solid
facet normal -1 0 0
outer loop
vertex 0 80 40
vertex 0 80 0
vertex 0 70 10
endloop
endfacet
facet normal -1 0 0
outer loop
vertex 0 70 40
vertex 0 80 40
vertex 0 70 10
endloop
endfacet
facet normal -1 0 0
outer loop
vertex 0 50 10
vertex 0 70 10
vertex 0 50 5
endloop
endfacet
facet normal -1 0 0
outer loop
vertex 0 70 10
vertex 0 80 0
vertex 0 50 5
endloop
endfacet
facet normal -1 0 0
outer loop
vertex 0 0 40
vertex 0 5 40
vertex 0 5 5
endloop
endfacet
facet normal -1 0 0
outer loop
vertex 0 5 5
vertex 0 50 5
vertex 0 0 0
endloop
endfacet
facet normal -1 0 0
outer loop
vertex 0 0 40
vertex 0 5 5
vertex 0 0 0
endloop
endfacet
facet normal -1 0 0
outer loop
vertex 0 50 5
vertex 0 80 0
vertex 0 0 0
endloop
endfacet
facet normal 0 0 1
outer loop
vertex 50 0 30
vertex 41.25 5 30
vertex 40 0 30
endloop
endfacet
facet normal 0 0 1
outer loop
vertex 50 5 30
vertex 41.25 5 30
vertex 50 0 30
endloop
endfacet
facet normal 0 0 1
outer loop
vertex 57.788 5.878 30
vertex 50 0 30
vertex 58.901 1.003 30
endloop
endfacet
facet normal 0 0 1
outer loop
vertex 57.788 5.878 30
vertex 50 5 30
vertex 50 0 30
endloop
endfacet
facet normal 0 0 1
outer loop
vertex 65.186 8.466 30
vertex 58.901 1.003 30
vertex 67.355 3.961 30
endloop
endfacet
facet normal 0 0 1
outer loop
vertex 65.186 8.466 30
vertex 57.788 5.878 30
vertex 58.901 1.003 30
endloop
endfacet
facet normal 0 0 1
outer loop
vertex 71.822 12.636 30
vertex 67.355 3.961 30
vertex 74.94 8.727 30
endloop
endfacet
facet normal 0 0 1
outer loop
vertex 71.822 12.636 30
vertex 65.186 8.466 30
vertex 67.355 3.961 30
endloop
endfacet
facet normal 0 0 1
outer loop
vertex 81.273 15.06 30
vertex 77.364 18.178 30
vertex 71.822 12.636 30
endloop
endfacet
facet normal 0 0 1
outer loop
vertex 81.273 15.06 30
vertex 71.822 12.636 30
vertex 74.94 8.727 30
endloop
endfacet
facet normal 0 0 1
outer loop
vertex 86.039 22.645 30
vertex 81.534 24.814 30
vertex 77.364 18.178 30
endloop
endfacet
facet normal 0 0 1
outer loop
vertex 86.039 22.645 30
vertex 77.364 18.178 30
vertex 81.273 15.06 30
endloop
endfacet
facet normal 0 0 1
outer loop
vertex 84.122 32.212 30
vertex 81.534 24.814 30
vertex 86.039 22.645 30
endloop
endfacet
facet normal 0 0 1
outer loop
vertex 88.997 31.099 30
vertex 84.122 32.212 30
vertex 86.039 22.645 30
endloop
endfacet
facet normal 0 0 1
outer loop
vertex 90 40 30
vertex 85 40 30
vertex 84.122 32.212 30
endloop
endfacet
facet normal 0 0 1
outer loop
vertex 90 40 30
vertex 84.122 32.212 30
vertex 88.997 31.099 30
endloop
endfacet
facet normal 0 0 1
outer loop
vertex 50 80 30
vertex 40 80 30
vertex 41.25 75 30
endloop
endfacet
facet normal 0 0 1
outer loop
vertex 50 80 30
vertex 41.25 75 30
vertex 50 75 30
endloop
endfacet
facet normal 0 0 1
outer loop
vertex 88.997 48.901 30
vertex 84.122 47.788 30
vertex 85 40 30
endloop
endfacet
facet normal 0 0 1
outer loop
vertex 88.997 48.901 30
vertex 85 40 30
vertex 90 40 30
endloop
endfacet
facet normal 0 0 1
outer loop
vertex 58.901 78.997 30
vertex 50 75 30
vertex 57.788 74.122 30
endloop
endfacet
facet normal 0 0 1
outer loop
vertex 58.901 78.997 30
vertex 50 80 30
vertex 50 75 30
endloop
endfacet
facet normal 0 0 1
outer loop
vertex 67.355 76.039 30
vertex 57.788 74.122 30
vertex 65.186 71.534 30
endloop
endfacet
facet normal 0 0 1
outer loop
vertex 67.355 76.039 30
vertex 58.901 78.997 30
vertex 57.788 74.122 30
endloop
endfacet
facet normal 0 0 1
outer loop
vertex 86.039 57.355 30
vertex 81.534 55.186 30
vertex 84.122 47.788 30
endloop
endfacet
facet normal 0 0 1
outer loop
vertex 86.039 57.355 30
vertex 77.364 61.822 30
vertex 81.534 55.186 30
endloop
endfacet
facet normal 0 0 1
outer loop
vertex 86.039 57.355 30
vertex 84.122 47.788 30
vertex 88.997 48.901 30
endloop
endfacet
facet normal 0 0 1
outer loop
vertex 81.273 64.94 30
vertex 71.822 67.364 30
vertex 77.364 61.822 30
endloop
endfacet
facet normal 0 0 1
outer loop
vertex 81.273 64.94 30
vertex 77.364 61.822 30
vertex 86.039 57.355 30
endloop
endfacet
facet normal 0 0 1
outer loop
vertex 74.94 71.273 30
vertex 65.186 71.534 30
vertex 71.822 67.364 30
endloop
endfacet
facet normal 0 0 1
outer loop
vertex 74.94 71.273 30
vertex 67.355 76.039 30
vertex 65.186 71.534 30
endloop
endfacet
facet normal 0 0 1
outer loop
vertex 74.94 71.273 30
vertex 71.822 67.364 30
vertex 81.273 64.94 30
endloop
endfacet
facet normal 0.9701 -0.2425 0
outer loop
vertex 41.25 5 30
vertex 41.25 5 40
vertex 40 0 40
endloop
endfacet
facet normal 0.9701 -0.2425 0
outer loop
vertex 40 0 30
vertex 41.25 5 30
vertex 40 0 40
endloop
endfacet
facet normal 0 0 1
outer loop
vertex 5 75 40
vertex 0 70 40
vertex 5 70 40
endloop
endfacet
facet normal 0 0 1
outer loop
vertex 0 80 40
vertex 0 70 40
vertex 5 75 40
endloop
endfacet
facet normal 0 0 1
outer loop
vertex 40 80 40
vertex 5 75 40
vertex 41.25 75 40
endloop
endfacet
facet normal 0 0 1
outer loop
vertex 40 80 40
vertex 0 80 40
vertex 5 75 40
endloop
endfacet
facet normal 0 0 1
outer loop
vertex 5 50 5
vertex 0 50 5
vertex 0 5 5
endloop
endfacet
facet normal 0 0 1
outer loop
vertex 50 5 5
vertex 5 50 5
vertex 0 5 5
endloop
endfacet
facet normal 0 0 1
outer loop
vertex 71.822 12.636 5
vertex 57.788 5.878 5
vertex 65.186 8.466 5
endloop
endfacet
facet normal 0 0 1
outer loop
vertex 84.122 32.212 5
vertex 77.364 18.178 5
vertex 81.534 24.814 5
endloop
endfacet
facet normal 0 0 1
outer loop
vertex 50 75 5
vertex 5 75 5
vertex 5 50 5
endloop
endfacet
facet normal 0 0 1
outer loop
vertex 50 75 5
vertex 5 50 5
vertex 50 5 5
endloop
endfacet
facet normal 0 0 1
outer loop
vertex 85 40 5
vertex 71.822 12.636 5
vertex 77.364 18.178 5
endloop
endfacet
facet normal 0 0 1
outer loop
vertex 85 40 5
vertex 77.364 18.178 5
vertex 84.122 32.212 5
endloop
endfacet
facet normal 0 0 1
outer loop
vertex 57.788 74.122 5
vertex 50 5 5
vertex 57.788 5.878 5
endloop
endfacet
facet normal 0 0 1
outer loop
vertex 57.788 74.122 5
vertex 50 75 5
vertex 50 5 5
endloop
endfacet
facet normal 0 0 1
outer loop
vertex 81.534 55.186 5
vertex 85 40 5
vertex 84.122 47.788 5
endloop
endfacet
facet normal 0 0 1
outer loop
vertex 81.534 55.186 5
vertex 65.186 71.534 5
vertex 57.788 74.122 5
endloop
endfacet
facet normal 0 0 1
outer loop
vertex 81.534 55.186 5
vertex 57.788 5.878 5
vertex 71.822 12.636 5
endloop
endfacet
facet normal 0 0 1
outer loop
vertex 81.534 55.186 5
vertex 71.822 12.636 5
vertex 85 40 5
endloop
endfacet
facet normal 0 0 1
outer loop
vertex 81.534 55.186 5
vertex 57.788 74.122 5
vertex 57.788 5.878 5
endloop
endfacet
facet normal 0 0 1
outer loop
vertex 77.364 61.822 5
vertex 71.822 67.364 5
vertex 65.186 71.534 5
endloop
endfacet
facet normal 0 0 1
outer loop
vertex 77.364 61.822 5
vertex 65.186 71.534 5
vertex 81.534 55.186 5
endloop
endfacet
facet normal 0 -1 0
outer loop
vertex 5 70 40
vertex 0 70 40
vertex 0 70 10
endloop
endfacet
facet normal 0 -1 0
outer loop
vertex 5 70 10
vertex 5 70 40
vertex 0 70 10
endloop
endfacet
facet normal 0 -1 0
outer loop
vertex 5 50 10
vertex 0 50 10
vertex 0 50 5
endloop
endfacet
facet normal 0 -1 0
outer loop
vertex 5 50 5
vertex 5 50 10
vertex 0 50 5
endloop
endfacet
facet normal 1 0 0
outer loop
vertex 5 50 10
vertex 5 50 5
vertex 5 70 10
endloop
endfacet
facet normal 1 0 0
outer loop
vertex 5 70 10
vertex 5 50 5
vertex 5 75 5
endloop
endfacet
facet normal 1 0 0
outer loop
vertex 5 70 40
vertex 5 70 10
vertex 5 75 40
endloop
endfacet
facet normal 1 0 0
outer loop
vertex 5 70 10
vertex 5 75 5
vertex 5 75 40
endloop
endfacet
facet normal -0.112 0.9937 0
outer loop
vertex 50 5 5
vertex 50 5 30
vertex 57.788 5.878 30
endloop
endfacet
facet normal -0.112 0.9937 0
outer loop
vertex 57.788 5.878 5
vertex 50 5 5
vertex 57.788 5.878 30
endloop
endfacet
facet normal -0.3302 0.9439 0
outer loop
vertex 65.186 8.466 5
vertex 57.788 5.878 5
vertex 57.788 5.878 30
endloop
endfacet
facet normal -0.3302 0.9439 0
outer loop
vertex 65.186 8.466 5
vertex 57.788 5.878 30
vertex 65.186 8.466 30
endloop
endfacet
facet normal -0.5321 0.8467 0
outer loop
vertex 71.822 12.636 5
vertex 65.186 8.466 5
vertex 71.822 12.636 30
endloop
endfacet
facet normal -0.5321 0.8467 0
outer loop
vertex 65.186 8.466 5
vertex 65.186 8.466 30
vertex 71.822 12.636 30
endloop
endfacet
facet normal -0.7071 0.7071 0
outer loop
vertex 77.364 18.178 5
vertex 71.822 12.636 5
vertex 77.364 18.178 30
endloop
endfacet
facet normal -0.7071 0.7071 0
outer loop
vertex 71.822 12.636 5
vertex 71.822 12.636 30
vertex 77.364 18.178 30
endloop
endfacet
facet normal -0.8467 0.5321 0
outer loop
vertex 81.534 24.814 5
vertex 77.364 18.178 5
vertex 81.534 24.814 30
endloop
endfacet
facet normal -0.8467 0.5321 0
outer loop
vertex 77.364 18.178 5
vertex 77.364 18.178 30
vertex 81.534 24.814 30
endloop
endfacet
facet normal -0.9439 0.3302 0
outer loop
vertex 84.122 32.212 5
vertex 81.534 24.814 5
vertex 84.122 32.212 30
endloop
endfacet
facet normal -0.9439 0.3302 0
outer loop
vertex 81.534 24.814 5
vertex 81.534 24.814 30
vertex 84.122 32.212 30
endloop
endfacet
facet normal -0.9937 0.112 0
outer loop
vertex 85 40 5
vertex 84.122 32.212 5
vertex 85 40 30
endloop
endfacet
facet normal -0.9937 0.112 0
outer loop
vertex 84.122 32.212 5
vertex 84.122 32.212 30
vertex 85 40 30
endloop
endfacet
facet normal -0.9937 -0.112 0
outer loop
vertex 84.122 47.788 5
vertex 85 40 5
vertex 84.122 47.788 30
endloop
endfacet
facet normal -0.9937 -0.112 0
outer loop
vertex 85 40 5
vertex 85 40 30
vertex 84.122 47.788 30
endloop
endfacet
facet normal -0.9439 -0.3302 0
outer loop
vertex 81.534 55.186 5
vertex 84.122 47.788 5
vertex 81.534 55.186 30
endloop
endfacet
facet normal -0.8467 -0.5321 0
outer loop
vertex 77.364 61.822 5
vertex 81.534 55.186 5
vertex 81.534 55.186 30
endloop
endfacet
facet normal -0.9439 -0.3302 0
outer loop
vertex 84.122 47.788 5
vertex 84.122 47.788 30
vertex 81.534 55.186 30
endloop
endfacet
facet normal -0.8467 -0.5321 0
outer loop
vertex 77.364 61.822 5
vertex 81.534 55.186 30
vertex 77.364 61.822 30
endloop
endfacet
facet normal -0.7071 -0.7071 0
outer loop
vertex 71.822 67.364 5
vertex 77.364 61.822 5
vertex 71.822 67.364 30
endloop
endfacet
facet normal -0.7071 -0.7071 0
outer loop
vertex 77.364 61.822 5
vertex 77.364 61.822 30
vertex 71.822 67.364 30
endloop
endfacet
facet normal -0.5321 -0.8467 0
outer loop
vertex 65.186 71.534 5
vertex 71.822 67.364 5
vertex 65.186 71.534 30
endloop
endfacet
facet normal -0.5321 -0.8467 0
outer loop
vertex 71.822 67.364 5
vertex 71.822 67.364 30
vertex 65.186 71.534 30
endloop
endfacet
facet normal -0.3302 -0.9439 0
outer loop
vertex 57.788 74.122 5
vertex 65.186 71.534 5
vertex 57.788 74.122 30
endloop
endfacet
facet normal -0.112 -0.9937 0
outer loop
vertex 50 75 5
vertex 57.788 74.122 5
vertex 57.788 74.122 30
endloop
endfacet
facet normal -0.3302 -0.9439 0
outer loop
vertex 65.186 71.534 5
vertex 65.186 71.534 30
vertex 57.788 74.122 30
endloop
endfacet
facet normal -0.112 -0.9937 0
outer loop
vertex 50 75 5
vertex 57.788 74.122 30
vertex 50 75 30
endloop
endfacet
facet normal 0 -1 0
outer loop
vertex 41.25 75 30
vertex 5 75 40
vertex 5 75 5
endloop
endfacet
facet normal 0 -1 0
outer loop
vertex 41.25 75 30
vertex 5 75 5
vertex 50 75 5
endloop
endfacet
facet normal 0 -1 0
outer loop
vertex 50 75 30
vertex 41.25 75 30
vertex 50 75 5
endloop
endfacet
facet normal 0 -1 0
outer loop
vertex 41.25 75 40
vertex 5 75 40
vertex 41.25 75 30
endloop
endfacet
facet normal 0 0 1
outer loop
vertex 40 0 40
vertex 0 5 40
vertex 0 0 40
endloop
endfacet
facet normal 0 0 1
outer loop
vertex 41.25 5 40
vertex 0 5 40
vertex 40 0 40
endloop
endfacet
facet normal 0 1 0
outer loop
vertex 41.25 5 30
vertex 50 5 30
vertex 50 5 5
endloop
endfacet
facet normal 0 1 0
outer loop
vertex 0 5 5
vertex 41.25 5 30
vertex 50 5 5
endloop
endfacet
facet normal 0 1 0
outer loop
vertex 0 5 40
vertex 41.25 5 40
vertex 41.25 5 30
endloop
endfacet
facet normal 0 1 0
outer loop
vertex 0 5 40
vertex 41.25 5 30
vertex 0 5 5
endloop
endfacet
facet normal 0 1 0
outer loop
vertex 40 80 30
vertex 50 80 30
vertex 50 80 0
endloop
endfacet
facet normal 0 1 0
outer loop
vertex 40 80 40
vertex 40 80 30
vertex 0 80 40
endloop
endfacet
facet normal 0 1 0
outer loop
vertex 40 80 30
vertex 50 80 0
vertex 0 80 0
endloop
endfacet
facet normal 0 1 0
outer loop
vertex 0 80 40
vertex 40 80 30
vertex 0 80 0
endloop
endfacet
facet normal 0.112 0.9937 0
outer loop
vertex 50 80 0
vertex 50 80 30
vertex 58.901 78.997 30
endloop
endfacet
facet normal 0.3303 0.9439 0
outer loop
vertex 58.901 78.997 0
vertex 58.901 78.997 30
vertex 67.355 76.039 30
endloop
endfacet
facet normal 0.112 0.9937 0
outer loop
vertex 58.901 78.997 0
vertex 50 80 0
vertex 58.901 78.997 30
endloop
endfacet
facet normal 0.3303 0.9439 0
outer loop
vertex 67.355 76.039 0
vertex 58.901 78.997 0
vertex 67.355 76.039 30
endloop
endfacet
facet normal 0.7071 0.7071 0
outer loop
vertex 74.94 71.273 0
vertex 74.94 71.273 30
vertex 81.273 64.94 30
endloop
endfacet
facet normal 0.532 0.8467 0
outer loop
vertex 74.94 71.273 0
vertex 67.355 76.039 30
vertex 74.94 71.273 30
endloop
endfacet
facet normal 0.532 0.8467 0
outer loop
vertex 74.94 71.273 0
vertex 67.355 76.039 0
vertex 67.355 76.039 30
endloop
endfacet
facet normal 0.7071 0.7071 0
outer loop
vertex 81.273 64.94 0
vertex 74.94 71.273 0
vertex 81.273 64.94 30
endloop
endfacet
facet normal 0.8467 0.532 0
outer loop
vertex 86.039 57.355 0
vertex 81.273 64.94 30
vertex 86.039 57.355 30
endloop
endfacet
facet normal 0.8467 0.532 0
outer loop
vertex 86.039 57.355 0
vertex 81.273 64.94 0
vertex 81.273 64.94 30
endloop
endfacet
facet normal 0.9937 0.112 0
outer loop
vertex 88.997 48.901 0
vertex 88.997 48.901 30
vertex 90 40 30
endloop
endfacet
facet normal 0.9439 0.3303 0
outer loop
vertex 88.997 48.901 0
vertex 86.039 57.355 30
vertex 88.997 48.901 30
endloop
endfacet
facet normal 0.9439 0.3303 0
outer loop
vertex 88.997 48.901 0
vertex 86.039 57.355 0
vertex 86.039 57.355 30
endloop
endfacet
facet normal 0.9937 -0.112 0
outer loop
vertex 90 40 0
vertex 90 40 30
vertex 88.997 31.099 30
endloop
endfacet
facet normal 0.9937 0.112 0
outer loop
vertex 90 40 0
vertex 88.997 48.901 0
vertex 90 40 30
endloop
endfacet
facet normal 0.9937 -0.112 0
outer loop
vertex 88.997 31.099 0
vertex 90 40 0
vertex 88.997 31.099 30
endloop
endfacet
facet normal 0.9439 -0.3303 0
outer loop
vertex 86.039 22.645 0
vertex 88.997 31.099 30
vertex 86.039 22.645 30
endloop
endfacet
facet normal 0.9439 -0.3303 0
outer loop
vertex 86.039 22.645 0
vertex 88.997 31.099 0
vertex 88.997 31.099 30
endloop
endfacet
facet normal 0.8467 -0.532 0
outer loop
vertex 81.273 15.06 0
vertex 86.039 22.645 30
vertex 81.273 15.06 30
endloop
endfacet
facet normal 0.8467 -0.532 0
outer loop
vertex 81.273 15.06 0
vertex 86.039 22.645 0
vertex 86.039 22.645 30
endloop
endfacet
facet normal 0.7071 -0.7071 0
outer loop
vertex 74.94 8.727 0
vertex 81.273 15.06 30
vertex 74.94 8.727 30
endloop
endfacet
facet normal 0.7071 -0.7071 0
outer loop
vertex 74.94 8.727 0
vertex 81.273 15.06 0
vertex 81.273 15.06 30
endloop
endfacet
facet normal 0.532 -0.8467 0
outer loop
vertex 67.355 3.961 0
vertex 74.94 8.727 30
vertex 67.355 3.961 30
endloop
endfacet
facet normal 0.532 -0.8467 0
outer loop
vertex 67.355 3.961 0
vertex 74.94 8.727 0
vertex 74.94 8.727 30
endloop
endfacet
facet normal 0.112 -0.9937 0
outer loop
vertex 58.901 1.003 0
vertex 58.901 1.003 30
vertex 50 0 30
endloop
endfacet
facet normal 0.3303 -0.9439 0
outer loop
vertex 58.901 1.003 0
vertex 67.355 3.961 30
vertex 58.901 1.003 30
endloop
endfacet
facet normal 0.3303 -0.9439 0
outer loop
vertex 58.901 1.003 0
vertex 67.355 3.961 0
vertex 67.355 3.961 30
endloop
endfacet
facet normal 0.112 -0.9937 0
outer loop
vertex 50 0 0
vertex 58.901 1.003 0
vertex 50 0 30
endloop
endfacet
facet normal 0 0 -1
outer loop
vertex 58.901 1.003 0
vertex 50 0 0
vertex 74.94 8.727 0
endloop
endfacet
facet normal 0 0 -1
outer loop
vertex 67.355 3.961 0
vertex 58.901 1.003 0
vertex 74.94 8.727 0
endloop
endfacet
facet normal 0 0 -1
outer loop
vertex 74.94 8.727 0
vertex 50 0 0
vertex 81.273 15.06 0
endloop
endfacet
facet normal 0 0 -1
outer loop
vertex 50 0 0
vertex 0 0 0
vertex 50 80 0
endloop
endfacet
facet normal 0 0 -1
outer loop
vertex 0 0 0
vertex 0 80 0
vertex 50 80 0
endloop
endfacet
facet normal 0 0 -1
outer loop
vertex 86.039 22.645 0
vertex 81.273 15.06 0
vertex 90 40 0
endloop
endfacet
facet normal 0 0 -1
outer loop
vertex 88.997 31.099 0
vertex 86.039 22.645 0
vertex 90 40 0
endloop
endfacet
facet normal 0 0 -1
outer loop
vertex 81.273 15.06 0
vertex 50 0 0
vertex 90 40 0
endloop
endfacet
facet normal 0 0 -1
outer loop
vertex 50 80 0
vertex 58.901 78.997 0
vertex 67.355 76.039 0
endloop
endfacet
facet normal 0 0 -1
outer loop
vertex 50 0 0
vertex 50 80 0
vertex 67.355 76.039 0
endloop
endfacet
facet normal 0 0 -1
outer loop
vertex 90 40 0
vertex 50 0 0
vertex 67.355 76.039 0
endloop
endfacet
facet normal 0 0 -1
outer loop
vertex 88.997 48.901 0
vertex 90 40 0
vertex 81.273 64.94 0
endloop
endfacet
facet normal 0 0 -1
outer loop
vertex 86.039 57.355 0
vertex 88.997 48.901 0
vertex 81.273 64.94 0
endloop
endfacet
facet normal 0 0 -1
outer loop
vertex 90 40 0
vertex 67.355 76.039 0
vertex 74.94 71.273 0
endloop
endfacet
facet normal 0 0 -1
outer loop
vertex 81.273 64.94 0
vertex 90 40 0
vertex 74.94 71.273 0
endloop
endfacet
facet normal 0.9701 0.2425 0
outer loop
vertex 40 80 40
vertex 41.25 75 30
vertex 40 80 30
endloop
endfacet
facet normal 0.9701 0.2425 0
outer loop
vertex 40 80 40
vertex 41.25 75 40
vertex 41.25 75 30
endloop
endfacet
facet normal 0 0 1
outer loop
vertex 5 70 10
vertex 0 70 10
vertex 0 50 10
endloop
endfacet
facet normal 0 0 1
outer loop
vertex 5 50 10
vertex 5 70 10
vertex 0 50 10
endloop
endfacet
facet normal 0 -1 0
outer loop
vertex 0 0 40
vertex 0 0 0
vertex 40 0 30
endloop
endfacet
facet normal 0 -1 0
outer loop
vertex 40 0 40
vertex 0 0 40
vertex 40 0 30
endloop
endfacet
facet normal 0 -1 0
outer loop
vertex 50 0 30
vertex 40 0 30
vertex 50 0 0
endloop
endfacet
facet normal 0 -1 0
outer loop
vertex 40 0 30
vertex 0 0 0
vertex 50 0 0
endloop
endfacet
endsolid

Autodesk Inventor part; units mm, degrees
ref_plane "YZ Plane" through (0, 0, 0) normal (1, 0, 0) x (0, 1, 0)
ref_plane "XZ Plane" through (0, 0, 0) normal (0, 1, 0) x (-1, 0, 0)
ref_plane "XY Plane" through (0, 0, 0) normal (0, 0, 1) x (1, 0, 0)
sketch "Sketch1" plane through (0, 0, 0) normal (0, 0, 1) x (1, 0, 0)
  line L0 (0, 0) -> (50, 0)
  line L1 (50, 0) -> (50, 80) construction
  line L2 (50, 80) -> (0, 80)
  line L3 (0, 80) -> (0, 0)
  circle A0 centre (50, 40) radius 40 construction
  arc A1 (50, 0) -> (50, 80) centre (50, 40) ccw
  dimension "d0" = 50
  dimension "d1" = 80
  dimension "d2" = 80
extrude "Extrusion1" add sketch "Sketch1" along normal blind 40
sketch "Sketch2" plane through (0, 0, 40) normal (0, 0, 1) x (1, 0, 0)
  line L0 (50, 80) -> (0, 80) projected
  arc A0 (50, 0) -> (50, 80) centre (50, 40) ccw projected
  line L1 (0, 0) -> (50, 0) projected
  line L2 (0, 75) -> (50, 75)
  arc A1 (50, 5) -> (50, 75) centre (50, 40) ccw
  line L3 (50, 5) -> (0, 5)
  line L4 (0, 75) -> (0, 5)
  line L5 (0, 80) -> (0, 0) projected
  dimension "d5" = 5
extrude "Extrusion2" cut sketch "Sketch2" against normal blind 35 contours L2 A1 L3 L4
sketch "Sketch3" plane through (0, 0, 0) normal (-1, 0, 0) x (0, 0, 1)
  line L0 (0, 80) -> (0, 0) projected
  line L1 (40, 75) -> (40, 5) projected
  line L2 (0, 80) -> (40, 80)
  line L3 (40, 80) -> (40, 70)
  line L4 (40, 70) -> (0, 70)
  line L5 (0, 70) -> (0, 80)
  line L6 (0, 80) -> (10, 80)
  line L7 (10, 80) -> (10, 50)
  line L8 (10, 50) -> (0, 50)
  line L9 (0, 50) -> (0, 80)
  line L10 (0, 0) -> (40, 0) projected
  dimension "d8" = 10
  dimension "d9" = 10
  dimension "d10" = 50
extrude "Extrusion3" add sketch "Sketch3" against normal blind 5
sketch "Sketch4" plane through (0, 0, 40) normal (0, 0, 1) x (1, 0, 0)
  line L0 (50, 80) -> (50, 0)
  arc A0 (50, 0) -> (50, 80) centre (50, 40) ccw projected
  arc A1 (50, 0) -> (50, 80) centre (50, 40) ccw projected
  arc A2 (50, 0) -> (50, 80) centre (50, 40) ccw
  line L1 (50, 40) -> (40, 80)
  line L2 (50, 80) -> (0, 80) projected
  line L3 (40, 80) -> (50, 80)
  line L4 (50, 40) -> (40, 0)
  line L5 (0, 0) -> (50, 0) projected
  line L6 (40, 0) -> (50, 0)
  dimension "d15" = 10
extrude "Extrusion4" cut sketch "Sketch4" against normal blind 10
properties part number "FA004" material "ABS Plastic"
